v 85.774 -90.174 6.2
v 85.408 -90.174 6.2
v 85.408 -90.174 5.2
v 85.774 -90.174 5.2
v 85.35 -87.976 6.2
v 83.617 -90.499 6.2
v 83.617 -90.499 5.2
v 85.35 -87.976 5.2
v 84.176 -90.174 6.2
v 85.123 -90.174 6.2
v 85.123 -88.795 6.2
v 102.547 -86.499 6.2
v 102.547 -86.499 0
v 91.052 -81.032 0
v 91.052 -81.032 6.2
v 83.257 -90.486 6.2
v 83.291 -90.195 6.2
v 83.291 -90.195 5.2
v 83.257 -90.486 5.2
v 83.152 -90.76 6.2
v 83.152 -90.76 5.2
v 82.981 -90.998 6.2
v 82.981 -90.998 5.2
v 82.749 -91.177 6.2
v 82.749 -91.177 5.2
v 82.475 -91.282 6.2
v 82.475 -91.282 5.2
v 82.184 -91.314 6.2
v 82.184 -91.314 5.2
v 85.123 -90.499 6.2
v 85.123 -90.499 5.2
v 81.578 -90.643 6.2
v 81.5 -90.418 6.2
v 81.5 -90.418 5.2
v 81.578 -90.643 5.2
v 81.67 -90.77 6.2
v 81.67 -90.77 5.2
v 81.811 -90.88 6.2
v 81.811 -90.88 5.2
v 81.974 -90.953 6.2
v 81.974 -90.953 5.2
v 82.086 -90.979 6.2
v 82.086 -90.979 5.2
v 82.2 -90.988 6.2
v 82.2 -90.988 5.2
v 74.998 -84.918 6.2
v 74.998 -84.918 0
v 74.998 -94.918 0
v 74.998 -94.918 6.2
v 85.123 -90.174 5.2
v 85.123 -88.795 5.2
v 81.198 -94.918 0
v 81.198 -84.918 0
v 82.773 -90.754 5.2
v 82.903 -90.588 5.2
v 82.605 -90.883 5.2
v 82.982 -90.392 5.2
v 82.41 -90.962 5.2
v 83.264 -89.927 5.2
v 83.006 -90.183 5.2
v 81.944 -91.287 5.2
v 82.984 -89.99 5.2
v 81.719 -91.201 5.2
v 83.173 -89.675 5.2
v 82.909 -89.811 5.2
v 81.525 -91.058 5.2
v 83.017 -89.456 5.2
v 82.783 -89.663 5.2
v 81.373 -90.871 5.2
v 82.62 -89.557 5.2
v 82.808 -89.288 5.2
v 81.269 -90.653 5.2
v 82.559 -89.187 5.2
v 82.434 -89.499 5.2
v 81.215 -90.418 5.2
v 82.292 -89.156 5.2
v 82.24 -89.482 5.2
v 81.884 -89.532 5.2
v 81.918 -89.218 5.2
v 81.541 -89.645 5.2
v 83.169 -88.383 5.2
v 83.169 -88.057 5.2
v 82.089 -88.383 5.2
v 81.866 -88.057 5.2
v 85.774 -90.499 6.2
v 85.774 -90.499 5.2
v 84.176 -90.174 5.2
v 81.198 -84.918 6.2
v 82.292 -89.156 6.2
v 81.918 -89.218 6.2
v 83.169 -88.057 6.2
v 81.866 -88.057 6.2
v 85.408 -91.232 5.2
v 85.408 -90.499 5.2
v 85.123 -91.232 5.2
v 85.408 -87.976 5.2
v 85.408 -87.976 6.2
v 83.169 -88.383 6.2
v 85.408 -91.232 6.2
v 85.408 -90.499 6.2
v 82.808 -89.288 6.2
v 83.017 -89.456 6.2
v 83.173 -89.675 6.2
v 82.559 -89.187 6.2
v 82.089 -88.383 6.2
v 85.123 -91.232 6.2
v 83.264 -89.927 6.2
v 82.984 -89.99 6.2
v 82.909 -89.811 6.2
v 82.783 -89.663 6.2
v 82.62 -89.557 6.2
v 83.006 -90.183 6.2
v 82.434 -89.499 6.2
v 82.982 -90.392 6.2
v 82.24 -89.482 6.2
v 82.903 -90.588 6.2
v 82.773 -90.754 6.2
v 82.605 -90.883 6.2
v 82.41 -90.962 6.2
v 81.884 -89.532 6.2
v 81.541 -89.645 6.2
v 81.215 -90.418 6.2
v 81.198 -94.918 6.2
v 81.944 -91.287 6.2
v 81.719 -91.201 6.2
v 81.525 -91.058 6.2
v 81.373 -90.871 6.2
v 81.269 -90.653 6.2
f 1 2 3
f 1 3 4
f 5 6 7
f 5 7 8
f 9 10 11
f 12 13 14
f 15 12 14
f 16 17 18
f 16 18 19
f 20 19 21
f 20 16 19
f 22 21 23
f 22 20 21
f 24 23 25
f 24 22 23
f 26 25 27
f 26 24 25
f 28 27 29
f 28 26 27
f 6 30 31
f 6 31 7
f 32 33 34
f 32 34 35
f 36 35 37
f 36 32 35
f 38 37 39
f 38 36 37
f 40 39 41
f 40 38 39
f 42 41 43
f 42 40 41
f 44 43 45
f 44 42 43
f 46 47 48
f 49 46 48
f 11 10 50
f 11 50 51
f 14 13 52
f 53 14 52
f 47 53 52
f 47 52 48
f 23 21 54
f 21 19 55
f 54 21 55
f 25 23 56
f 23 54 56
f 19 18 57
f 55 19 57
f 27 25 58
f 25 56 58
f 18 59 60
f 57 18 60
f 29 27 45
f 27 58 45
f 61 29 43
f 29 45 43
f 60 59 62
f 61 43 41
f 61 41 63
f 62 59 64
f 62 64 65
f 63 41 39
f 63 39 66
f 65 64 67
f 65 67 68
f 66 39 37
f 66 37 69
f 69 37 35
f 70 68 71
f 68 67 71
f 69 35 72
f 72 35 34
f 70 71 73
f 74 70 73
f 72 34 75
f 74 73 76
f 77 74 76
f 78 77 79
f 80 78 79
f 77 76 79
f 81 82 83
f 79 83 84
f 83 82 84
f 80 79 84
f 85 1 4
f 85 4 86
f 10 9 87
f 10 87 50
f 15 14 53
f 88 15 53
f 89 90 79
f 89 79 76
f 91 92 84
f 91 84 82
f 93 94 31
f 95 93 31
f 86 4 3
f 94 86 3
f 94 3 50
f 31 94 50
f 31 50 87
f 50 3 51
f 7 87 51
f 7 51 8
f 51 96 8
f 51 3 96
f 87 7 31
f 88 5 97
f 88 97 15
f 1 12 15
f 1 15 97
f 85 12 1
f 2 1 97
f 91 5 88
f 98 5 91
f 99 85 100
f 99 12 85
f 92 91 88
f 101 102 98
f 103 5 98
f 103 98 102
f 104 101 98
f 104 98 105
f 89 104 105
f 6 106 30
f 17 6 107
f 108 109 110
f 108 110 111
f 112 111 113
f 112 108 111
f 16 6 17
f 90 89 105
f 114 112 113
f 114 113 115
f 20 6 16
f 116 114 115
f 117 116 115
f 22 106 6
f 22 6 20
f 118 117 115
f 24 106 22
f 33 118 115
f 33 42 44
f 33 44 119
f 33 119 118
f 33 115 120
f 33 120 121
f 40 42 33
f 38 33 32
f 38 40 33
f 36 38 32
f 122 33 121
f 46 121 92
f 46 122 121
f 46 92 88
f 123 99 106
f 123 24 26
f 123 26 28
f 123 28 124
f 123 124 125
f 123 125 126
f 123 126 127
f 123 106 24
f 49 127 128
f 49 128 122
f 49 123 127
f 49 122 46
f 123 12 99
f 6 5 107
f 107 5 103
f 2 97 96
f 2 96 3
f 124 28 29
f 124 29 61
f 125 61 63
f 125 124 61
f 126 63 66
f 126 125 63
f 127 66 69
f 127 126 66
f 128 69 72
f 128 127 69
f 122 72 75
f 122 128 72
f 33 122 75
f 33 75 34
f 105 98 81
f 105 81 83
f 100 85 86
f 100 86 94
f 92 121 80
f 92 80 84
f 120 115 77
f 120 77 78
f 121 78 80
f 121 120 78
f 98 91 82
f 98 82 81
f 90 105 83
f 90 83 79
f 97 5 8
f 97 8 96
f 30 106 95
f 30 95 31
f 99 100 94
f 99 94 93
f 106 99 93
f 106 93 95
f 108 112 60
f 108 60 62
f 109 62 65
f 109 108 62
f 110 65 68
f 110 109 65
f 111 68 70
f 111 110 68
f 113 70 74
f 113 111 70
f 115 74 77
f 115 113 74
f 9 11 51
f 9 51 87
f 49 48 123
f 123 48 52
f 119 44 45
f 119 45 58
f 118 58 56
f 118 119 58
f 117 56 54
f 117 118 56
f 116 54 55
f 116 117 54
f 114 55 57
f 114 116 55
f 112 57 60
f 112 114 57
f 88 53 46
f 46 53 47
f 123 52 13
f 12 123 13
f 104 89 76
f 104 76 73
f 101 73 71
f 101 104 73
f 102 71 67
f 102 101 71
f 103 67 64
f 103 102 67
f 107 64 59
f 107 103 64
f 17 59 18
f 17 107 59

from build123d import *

# Parameters (mm, degrees)
BOSS_EXTRUDE1_DEPTH = 6.2
CUT_EXTRUDE1_DEPTH  = 1


with BuildPart() as part:
    # Sketch1 → Boss-Extrude1 (new body)
    with BuildSketch(Plane(origin=(0, 0, 0), x_dir=(-1, 0, 0), z_dir=(0, 0, 1))):
        Polygon((-81.198418694, 94.917906577), (-102.547087364, 86.499465833), (-91.051660388, 81.032468444), (-81.198418694, 84.917906577), (-74.998418694, 84.917906577), (-74.998418694, 94.917906577), align=None)
    extrude(amount=BOSS_EXTRUDE1_DEPTH)

    # Sketch2 → Cut-Extrude1 (cut)
    with BuildSketch(Plane.XY.offset(6.2)):
        with BuildLine():
            Line((83.169030289, -88.057134239), (83.169030289, -88.382775265))
            Line((83.169030289, -88.382775265), (82.089072356, -88.382775265))
            Line((82.089072356, -88.382775265), (81.917983614, -89.217866411))
            add(Edge.make_bspline(
                [(81.917983614, -89.217866411), (81.951598586, -89.208586093), (82.016722277, -89.190606945), (82.112843008, -89.170644567), (82.204094507, -89.158610914), (82.263308593, -89.156967797), (82.291961979, -89.156172701)],
                knots=[0, 0, 0, 0, 0.000104595, 0.000202637, 0.000294305, 0.000380252, 0.000380252, 0.000380252, 0.000380252], degree=3))
            add(Edge.make_bspline(
                [(82.291961979, -89.156172701), (82.327416515, -89.156940085), (82.397128989, -89.158448955), (82.499127177, -89.172937704), (82.596493445, -89.195743198), (82.689024166, -89.227602529), (82.776890523, -89.268342072), (82.859284096, -89.319232733), (82.937441632, -89.378680826), (83.009960985, -89.447029515), (83.075750893, -89.522251268), (83.133595755, -89.603130193), (83.182728962, -89.688880287), (83.222244789, -89.780320839), (83.25379915, -89.876440928), (83.274801317, -89.978251914), (83.288786474, -90.084794137), (83.290348924, -90.157641854), (83.291145673, -90.194789488)],
                knots=[0, 0, 0, 0, 0.000106308, 0.000209029, 0.000308378, 0.000405929, 0.000502102, 0.000598312, 0.00069588, 0.000796219, 0.000896736, 0.000995218, 0.001094066, 0.001192613, 0.001293582, 0.001396995, 0.001504047, 0.001615439, 0.001615439, 0.001615439, 0.001615439], degree=3))
            add(Edge.make_bspline(
                [(83.291145673, -90.194789488), (83.290542355, -90.220663216), (83.289343872, -90.272061012), (83.283249153, -90.348391823), (83.271514611, -90.423106678), (83.255759604, -90.496215491), (83.23531041, -90.56757985), (83.21055534, -90.637404022), (83.180260372, -90.705253415), (83.147030482, -90.771770023), (83.109614034, -90.835450098), (83.068086388, -90.895003107), (83.024211978, -90.95132242), (82.977003007, -91.00380402), (82.926020676, -91.052103044), (82.87188242, -91.096506128), (82.815020239, -91.137764191), (82.754554412, -91.174202483), (82.691832303, -91.207733164), (82.625948134, -91.235240945), (82.558401642, -91.259834067), (82.488220647, -91.279436995), (82.415564117, -91.294797241), (82.340312285, -91.305229929), (82.26285982, -91.312828554), (82.210358916, -91.313304221), (82.183838983, -91.313544496)],
                knots=[0, 0, 0, 0, 7.7636e-05, 0.000154223, 0.000229512, 0.000304362, 0.000378447, 0.000452077, 0.000526407, 0.000601214, 0.00067506, 0.000747747, 0.00081887, 0.000889121, 0.000959302, 0.001029336, 0.001099058, 0.00116985, 0.001240974, 0.00131221, 0.00138383, 0.001456517, 0.001530612, 0.001606437, 0.001684346, 0.001763871, 0.001763871, 0.001763871, 0.001763871], degree=3))
            add(Edge.make_bspline(
                [(82.183838983, -91.313544496), (82.152203119, -91.312917807), (82.089963294, -91.311684871), (81.998776779, -91.298786674), (81.911042816, -91.280313692), (81.827467652, -91.252522219), (81.747302292, -91.217699459), (81.671625969, -91.17368836), (81.598505015, -91.123814459), (81.530911953, -91.06495871), (81.468177479, -91.000628056), (81.412019432, -90.930816481), (81.362005401, -90.856676202), (81.318936302, -90.777847162), (81.282198811, -90.694536495), (81.253338072, -90.606432058), (81.230044136, -90.513994197), (81.220189462, -90.450354942), (81.215184135, -90.418031675)],
                knots=[0, 0, 0, 0, 9.4843e-05, 0.000186593, 0.000275792, 0.000363484, 0.000450342, 0.000537514, 0.000625728, 0.000715478, 0.000805885, 0.000894984, 0.00098389, 0.001073836, 0.001164117, 0.001256635, 0.001351658, 0.001449737, 0.001449737, 0.001449737, 0.001449737], degree=3))
            Line((81.215184135, -90.418031675), (81.500120032, -90.418031675))
            add(Edge.make_bspline(
                [(81.500120032, -90.418031675), (81.507130938, -90.448308886), (81.520606288, -90.506503365), (81.55018436, -90.588265368), (81.586348404, -90.661126378), (81.62935092, -90.726050214), (81.680649876, -90.78266409), (81.739187287, -90.833116711), (81.804817007, -90.878632721), (81.877745151, -90.916571945), (81.95468273, -90.9489286), (82.035207271, -90.970474781), (82.117126214, -90.985624876), (82.172533021, -90.987141402), (82.200375441, -90.98790347)],
                knots=[0, 0, 0, 0, 9.3172e-05, 0.000179081, 0.000260145, 0.000336703, 0.000411917, 0.000488562, 0.000568128, 0.000650923, 0.00073478, 0.000817953, 0.000900557, 0.000983994, 0.000983994, 0.000983994, 0.000983994], degree=3))
            add(Edge.make_bspline(
                [(82.200375441, -90.98790347), (82.22755203, -90.987158907), (82.281062956, -90.985692857), (82.359813285, -90.974408896), (82.435843535, -90.957030242), (82.508403495, -90.931022588), (82.578762891, -90.899413451), (82.645141954, -90.858850489), (82.709460993, -90.812168901), (82.7697208, -90.758686815), (82.824910872, -90.699750021), (82.873675353, -90.636724099), (82.91429441, -90.569489531), (82.948524637, -90.499210314), (82.974517273, -90.425116194), (82.993060163, -90.347554414), (83.003948652, -90.266333396), (83.005446508, -90.210934808), (83.006209776, -90.182705153)],
                knots=[0, 0, 0, 0, 8.15e-05, 0.000160473, 0.000238226, 0.000315066, 0.000391338, 0.000469218, 0.000547964, 0.000629516, 0.000710512, 0.000789892, 0.000868102, 0.000945761, 0.001024012, 0.00110315, 0.001184644, 0.001269321, 0.001269321, 0.001269321, 0.001269321], degree=3))
            add(Edge.make_bspline(
                [(83.006209776, -90.182705153), (83.005612441, -90.157236435), (83.004443243, -90.107385045), (82.994890511, -90.034451479), (82.978274401, -89.965442362), (82.955211309, -89.900024449), (82.925929185, -89.838136041), (82.890145744, -89.779713265), (82.847189447, -89.725526145), (82.798120377, -89.675549328), (82.744364868, -89.629425763), (82.684998045, -89.590106485), (82.621262254, -89.557028502), (82.553925403, -89.528482533), (82.481385817, -89.507980428), (82.405080014, -89.492588132), (82.324184001, -89.483684196), (82.268874876, -89.482448768), (82.240444552, -89.481813727)],
                knots=[0, 0, 0, 0, 7.6388e-05, 0.000149519, 0.000220172, 0.000288967, 0.000357247, 0.000425206, 0.000494043, 0.000564207, 0.000635056, 0.000706145, 0.000777268, 0.000850264, 0.000925136, 0.001002969, 0.001083601, 0.001168886, 0.001168886, 0.001168886, 0.001168886], degree=3))
            add(Edge.make_bspline(
                [(82.240444552, -89.481813727), (82.215834738, -89.482340406), (82.165021715, -89.483427864), (82.087077437, -89.491434758), (82.005169945, -89.504351832), (81.919613224, -89.522119357), (81.830150335, -89.545370405), (81.736970071, -89.573232845), (81.639876515, -89.606544944), (81.574455436, -89.631702023), (81.540825161, -89.644634239)],
                knots=[0, 0, 0, 0, 7.3822e-05, 0.000152423, 0.000234822, 0.000322511, 0.00041445, 0.000512043, 0.000614219, 0.000722306, 0.000722306, 0.000722306, 0.000722306], degree=3))
            Line((81.540825161, -89.644634239), (81.866466186, -88.057134239))
            Line((81.866466186, -88.057134239), (83.169030289, -88.057134239))
        make_face()
        Polygon((85.349934736, -87.975723983), (85.40781234, -87.975723983), (85.40781234, -90.173800906), (85.774158494, -90.173800906), (85.774158494, -90.499441932), (85.40781234, -90.499441932), (85.40781234, -91.232134239), (85.122876443, -91.232134239), (85.122876443, -90.499441932), (83.616786699, -90.499441932), align=None)
        Polygon((85.122876443, -90.173800906), (85.122876443, -88.794914688), (84.176482212, -90.173800906), align=None, mode=Mode.SUBTRACT)
    extrude(amount=-CUT_EXTRUDE1_DEPTH, mode=Mode.SUBTRACT)


solid = part.part
